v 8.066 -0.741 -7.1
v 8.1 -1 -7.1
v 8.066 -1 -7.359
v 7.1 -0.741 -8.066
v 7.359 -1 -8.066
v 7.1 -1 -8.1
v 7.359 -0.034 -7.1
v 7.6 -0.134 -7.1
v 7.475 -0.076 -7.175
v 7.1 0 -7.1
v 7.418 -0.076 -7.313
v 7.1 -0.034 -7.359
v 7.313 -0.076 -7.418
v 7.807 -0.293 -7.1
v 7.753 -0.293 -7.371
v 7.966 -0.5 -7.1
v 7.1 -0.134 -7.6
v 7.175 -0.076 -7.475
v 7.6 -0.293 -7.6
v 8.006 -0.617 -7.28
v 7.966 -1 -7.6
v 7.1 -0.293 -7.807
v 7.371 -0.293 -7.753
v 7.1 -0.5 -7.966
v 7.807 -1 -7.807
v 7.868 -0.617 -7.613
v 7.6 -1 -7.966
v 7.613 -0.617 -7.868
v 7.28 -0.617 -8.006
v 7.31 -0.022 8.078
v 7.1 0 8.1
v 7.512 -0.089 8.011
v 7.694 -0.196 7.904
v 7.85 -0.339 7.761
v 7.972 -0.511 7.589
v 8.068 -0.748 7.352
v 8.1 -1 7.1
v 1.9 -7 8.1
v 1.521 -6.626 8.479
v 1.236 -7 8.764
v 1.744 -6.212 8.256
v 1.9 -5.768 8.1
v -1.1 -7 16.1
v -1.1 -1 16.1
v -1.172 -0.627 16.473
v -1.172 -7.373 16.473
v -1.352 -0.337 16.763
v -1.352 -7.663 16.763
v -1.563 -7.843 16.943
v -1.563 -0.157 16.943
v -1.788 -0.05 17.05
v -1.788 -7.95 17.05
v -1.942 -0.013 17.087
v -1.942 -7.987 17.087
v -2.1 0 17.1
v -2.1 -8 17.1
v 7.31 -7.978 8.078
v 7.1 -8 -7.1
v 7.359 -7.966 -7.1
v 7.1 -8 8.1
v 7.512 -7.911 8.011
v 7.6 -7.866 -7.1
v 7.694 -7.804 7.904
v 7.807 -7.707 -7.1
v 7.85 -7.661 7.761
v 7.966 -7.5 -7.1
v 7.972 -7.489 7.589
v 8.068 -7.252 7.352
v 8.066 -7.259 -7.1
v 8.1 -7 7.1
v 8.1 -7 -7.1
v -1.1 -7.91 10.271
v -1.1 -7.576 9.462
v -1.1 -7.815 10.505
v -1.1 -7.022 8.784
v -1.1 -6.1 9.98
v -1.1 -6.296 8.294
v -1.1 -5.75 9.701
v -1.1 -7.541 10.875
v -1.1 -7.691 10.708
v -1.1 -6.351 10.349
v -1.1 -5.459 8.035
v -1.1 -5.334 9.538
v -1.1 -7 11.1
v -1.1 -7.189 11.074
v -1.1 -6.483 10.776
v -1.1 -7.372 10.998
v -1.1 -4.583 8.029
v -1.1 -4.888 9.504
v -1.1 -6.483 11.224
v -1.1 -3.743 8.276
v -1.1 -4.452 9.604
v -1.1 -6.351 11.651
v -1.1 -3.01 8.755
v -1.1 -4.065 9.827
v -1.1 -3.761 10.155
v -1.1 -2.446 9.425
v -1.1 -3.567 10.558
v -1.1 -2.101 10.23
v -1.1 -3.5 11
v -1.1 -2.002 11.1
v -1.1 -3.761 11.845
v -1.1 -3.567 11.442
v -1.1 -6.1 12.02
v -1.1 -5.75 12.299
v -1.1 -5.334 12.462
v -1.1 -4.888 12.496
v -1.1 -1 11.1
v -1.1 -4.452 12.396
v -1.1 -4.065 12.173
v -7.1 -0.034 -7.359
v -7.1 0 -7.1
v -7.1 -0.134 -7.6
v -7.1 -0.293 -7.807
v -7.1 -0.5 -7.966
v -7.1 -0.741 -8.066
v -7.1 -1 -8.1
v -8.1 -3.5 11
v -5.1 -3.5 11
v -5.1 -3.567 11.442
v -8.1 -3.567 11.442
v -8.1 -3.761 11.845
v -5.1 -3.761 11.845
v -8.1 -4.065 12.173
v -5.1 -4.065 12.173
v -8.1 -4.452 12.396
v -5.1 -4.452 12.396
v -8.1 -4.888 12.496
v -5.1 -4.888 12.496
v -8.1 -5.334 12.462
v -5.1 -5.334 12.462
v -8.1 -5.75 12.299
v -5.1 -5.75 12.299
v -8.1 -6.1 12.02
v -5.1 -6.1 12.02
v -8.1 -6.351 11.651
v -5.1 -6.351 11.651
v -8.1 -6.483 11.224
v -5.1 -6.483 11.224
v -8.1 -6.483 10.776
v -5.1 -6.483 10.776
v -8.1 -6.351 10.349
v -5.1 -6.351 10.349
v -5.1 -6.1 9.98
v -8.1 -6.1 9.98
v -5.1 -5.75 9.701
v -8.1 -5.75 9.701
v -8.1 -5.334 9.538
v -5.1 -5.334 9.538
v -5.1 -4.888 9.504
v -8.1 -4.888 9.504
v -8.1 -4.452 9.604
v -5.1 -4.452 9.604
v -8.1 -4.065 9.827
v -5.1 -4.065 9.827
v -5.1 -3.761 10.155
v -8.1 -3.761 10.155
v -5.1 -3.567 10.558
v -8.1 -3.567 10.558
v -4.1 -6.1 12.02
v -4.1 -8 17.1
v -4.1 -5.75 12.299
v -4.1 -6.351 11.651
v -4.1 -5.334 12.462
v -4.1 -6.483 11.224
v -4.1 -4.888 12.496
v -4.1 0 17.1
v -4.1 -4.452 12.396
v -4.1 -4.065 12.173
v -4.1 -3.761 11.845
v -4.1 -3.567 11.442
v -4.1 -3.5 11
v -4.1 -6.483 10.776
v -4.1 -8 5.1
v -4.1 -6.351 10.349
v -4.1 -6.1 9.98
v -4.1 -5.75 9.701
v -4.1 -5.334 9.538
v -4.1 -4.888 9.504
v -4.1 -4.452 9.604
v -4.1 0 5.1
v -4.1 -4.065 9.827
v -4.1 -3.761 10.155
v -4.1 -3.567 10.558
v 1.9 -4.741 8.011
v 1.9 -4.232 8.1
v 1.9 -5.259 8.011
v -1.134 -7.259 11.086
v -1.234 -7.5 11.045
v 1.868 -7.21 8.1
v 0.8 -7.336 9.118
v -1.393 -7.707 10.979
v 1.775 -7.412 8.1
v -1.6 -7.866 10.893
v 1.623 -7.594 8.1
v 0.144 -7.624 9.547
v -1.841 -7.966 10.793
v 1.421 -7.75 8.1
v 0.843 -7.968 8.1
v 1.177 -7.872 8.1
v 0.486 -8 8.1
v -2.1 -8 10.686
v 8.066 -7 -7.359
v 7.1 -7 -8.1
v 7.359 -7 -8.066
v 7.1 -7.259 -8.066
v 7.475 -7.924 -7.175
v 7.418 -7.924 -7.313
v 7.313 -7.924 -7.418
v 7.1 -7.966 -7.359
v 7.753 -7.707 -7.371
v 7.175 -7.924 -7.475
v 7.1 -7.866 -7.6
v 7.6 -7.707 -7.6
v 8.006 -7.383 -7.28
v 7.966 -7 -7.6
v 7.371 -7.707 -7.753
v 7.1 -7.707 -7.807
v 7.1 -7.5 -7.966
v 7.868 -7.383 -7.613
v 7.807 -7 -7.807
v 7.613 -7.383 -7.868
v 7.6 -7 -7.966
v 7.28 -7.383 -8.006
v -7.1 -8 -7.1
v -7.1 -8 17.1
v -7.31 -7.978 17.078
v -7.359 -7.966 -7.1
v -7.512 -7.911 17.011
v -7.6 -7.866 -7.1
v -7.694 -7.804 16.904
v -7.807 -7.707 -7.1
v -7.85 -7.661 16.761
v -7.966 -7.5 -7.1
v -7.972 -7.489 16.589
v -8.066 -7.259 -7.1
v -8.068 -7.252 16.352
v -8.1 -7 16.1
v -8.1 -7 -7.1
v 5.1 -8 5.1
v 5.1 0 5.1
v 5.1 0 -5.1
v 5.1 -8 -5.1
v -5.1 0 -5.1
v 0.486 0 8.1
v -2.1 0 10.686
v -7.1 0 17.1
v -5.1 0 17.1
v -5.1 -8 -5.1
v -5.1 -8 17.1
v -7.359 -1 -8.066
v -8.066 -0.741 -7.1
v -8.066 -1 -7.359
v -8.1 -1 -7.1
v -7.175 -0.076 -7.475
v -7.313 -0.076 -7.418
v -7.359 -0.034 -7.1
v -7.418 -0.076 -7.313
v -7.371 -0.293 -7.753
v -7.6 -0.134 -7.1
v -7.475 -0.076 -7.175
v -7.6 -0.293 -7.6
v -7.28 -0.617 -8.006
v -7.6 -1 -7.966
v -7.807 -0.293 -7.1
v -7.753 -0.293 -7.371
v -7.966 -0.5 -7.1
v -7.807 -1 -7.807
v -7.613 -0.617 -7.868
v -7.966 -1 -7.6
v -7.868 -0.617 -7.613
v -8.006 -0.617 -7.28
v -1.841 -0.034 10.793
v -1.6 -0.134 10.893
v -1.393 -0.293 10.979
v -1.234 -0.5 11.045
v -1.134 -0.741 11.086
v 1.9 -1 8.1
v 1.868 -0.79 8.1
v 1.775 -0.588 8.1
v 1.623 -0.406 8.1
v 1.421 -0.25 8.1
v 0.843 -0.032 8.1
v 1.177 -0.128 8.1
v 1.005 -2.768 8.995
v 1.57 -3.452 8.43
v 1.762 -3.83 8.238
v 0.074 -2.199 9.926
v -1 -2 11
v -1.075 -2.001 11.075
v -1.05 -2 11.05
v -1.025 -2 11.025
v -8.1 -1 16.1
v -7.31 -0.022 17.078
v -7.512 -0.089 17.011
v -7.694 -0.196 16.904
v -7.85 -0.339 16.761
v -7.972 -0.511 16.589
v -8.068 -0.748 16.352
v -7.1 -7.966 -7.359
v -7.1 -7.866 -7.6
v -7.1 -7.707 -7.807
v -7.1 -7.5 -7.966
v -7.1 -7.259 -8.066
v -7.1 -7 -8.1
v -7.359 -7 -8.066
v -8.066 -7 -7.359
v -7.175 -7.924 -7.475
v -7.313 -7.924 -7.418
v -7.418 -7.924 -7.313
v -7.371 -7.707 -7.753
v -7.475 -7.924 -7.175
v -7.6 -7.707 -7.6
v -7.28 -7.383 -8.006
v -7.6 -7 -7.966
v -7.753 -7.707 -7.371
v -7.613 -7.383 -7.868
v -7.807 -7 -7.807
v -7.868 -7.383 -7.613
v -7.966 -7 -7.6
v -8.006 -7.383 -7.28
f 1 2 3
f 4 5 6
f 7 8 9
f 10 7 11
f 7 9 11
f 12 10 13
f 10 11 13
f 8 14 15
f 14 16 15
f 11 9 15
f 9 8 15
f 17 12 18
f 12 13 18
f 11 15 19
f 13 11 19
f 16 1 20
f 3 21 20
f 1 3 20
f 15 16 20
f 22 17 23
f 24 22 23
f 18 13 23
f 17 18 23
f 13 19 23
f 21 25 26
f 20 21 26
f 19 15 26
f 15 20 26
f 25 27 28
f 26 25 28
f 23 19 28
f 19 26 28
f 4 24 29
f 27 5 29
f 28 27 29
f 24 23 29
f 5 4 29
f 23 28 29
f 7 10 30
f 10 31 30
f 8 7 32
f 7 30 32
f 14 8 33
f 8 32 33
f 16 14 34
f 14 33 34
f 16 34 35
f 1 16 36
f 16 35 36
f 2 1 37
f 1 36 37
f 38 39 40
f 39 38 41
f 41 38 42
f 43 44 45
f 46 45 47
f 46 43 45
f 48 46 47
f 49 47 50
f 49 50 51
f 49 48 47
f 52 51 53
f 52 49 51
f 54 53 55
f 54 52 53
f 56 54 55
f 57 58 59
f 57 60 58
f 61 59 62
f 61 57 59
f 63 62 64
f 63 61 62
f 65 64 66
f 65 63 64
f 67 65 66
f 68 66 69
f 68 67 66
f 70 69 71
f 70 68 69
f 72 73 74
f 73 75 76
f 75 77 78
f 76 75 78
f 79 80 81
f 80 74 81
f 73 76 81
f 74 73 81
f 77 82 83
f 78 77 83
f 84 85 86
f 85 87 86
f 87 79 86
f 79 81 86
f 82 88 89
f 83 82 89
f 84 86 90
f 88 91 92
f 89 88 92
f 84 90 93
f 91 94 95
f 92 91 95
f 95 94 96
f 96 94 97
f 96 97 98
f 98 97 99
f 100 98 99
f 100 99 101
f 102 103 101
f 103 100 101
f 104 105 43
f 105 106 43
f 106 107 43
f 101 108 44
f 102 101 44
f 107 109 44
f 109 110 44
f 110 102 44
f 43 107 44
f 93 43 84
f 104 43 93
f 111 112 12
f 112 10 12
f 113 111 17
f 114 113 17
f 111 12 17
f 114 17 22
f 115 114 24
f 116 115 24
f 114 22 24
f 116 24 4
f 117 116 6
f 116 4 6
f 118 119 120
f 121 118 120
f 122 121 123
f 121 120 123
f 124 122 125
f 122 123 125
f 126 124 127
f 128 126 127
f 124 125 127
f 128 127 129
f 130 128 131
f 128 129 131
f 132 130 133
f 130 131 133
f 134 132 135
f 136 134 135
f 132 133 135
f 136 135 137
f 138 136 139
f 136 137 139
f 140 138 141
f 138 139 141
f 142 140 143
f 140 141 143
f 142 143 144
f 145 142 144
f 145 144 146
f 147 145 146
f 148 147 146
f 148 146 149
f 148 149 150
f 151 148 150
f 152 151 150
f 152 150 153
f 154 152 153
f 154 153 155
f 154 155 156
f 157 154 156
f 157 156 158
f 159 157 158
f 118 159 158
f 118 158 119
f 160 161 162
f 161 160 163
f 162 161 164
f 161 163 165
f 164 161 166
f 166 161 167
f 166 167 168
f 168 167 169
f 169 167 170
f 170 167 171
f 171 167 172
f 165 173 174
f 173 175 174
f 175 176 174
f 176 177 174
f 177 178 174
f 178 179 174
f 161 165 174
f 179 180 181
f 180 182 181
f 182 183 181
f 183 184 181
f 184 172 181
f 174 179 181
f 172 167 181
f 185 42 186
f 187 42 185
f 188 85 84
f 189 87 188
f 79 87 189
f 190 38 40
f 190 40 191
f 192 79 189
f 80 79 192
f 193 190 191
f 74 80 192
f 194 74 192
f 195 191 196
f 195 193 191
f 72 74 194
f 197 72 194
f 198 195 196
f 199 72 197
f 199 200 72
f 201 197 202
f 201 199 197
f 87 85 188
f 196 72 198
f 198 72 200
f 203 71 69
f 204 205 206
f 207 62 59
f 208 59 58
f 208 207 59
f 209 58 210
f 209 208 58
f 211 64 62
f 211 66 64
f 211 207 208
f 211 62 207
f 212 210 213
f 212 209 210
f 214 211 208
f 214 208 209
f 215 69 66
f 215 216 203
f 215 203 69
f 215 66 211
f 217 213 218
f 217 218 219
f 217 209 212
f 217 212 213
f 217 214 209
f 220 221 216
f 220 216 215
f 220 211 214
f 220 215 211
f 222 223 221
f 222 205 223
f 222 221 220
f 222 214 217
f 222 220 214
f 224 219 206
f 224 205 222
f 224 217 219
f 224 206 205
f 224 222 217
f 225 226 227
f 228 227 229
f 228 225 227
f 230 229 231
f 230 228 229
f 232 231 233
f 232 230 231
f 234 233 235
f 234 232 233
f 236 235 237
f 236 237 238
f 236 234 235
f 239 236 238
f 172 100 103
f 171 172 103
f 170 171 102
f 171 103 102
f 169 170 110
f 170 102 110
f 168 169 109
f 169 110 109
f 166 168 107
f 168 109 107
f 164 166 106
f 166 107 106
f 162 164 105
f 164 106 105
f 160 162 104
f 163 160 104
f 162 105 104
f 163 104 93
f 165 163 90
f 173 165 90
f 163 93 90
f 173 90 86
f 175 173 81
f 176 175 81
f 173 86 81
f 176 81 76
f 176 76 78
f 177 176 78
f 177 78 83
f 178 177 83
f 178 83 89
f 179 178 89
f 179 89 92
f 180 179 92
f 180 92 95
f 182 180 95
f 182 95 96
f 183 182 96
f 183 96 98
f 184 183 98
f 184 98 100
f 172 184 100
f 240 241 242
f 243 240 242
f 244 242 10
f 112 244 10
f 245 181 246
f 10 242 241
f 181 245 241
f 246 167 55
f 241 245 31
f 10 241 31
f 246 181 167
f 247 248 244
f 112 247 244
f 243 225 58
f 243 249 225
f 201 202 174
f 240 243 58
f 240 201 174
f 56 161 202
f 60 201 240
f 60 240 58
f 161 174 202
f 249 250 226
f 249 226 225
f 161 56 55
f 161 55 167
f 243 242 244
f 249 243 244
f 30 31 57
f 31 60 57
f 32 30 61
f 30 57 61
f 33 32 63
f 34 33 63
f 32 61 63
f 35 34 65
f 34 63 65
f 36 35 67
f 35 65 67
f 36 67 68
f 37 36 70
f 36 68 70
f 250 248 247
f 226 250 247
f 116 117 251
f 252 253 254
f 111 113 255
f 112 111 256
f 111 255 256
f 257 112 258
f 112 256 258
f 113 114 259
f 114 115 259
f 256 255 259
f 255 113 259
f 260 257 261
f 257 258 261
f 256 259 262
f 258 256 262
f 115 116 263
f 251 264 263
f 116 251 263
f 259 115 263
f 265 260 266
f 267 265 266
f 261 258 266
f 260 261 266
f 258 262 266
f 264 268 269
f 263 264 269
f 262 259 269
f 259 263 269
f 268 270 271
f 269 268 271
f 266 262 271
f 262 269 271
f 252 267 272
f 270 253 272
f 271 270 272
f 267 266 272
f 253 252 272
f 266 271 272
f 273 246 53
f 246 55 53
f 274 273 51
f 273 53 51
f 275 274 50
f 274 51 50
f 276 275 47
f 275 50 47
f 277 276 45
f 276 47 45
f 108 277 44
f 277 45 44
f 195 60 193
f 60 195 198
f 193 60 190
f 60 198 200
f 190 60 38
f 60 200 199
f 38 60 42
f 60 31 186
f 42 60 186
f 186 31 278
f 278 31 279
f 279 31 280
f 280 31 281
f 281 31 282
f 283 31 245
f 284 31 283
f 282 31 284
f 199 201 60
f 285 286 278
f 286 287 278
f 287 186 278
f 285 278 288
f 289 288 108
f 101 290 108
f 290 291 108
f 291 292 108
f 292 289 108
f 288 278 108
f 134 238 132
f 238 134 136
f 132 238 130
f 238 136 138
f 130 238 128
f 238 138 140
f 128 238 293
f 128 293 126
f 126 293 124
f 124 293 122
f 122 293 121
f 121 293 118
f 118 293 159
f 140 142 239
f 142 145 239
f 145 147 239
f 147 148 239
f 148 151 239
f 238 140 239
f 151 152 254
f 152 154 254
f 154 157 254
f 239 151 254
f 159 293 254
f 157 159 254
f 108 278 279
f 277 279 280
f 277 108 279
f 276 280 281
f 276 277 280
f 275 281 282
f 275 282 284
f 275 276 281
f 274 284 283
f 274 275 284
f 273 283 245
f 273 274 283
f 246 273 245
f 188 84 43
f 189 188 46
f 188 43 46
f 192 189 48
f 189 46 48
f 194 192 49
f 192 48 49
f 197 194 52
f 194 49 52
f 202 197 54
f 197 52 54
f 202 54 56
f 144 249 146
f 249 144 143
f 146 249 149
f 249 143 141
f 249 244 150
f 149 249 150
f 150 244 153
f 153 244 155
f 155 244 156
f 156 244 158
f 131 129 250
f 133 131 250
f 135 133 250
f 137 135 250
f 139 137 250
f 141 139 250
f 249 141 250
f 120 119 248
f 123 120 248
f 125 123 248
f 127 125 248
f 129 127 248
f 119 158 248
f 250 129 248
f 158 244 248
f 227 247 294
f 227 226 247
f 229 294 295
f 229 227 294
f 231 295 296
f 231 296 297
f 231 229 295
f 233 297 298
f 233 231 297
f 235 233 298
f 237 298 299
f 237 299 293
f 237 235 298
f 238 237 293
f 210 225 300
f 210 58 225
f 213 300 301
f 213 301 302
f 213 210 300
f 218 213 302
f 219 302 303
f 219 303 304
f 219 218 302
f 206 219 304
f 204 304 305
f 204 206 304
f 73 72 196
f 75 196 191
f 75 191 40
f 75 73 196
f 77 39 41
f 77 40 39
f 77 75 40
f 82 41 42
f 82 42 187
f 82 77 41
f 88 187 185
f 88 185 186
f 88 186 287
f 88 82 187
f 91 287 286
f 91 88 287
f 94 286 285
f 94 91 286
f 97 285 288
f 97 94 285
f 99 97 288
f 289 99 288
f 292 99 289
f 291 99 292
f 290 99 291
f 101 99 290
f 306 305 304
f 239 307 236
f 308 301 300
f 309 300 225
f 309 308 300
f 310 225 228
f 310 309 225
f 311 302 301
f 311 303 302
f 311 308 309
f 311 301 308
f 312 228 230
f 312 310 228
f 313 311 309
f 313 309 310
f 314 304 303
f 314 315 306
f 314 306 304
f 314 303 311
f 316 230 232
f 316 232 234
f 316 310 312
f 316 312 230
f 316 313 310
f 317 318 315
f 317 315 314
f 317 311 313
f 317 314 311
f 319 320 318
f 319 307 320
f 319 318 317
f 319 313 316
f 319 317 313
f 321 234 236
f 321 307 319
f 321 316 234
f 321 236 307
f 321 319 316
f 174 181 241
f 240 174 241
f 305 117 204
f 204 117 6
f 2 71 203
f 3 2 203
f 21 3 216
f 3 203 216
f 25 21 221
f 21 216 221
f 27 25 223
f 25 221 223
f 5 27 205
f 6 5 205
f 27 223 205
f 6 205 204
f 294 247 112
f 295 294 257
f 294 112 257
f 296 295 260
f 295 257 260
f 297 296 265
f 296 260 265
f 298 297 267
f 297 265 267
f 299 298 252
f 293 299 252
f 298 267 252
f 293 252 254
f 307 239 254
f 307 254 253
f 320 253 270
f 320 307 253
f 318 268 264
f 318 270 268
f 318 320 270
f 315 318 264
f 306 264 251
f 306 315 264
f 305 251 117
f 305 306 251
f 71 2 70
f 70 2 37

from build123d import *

# Parameters (mm, degrees)
F1_DEPTH    = 8
F2_R        = 1.5
F3_DEPTH    = 7.001
F4_T4_DEPTH = 8
F4_S5_R     = 1.5
F4_T6_DEPTH = 6
F5_R        = 1
F6_R        = 1
F7_R        = 3
F8_DEPTH    = 3


# Not quite as in the source:
# - a fillet or chamfer that OpenCascade refuses, or shapes differently, is made with other operations: its cross-section is extruded or revolved along the edge and cut away or added


with BuildPart() as f1:
    # F0 (on Front) → F1 (new body)
    with BuildSketch(Plane.XZ):
        Polygon((5.1, 5.1), (5.1, -5.1), (-5.1, -5.1), (-5.1, 5.1), (-5.1, 8.1), (-5.1, 17.1), (-8.1, 17.1), (-8.1, 8.1), (-8.1, -8.1), (8.1, -8.1), (8.1, 8.1), (-1.1, 8.1), (-1.1, 17.1), (-4.1, 17.1), (-4.1, 8.1), (-4.1, 5.1), align=None)
    extrude(amount=F1_DEPTH)

    # F2 (on face) → F3 (cut, through all)
    with BuildSketch(Plane.YZ.offset(-1.1)):
        with Locations((-5, 11)):
            Circle(F2_R)
    extrude(amount=-F3_DEPTH, mode=Mode.SUBTRACT)

    # F4: chamfer of 3 on 1 edges, made by hand


with BuildPart() as f4_tool2:
    # F4_s3 → F4_t4 (new body)
    with BuildSketch(Plane.XZ):
        Polygon((1.9, 8.1), (-1.1, 11.1), (-1.1, 8.1), align=None)
    extrude(amount=F4_T4_DEPTH)

    # F4_s5 → F4_t6 (cut, symmetric)
    with BuildSketch(Plane.YZ.offset(0.4)):
        with Locations((-5, 11)):
            Circle(F4_S5_R)
    extrude(amount=F4_T6_DEPTH, both=True, mode=Mode.SUBTRACT)


with BuildPart() as f1_1:
    add(f1.part)

    # F4_t1: union F4_tool2
    add(f4_tool2.part)

    # F5
    f5_edges = [f1_1.edges().sort_by_distance(p)[0] for p in [
        (8.1, -4, -8.1),
        (8.1, -4, 8.1),
        (8.1, 0, 0),
        (8.1, -8, 0),
        (-8.1, -4, -8.1),
        (0, 0, -8.1),
        (0, -8, -8.1),
        (-8.1, -4, 17.1),
        (-8.1, 0, 4.5),
        (-8.1, -8, 4.5),
        (-1.1, -4, 17.1),
        (-1.1, 0, 14.1),
        (-1.1, -8, 14.1),
    ]]
    fillet(f5_edges, radius=F5_R)

    # F6
    f6_edges = [f1_1.edges().sort_by_distance(p)[0] for p in [
        (0.4, 0, 9.6),
        (0.4, -8, 9.6),
    ]]
    fillet(f6_edges, radius=F6_R)

    # F7 (on face) → F8 (cut)
    with BuildSketch(Plane.YZ.offset(-1.1)):
        with Locations((-5, 11)):
            Circle(F7_R)
    extrude(amount=F8_DEPTH, mode=Mode.SUBTRACT)


solid = f1_1.part
